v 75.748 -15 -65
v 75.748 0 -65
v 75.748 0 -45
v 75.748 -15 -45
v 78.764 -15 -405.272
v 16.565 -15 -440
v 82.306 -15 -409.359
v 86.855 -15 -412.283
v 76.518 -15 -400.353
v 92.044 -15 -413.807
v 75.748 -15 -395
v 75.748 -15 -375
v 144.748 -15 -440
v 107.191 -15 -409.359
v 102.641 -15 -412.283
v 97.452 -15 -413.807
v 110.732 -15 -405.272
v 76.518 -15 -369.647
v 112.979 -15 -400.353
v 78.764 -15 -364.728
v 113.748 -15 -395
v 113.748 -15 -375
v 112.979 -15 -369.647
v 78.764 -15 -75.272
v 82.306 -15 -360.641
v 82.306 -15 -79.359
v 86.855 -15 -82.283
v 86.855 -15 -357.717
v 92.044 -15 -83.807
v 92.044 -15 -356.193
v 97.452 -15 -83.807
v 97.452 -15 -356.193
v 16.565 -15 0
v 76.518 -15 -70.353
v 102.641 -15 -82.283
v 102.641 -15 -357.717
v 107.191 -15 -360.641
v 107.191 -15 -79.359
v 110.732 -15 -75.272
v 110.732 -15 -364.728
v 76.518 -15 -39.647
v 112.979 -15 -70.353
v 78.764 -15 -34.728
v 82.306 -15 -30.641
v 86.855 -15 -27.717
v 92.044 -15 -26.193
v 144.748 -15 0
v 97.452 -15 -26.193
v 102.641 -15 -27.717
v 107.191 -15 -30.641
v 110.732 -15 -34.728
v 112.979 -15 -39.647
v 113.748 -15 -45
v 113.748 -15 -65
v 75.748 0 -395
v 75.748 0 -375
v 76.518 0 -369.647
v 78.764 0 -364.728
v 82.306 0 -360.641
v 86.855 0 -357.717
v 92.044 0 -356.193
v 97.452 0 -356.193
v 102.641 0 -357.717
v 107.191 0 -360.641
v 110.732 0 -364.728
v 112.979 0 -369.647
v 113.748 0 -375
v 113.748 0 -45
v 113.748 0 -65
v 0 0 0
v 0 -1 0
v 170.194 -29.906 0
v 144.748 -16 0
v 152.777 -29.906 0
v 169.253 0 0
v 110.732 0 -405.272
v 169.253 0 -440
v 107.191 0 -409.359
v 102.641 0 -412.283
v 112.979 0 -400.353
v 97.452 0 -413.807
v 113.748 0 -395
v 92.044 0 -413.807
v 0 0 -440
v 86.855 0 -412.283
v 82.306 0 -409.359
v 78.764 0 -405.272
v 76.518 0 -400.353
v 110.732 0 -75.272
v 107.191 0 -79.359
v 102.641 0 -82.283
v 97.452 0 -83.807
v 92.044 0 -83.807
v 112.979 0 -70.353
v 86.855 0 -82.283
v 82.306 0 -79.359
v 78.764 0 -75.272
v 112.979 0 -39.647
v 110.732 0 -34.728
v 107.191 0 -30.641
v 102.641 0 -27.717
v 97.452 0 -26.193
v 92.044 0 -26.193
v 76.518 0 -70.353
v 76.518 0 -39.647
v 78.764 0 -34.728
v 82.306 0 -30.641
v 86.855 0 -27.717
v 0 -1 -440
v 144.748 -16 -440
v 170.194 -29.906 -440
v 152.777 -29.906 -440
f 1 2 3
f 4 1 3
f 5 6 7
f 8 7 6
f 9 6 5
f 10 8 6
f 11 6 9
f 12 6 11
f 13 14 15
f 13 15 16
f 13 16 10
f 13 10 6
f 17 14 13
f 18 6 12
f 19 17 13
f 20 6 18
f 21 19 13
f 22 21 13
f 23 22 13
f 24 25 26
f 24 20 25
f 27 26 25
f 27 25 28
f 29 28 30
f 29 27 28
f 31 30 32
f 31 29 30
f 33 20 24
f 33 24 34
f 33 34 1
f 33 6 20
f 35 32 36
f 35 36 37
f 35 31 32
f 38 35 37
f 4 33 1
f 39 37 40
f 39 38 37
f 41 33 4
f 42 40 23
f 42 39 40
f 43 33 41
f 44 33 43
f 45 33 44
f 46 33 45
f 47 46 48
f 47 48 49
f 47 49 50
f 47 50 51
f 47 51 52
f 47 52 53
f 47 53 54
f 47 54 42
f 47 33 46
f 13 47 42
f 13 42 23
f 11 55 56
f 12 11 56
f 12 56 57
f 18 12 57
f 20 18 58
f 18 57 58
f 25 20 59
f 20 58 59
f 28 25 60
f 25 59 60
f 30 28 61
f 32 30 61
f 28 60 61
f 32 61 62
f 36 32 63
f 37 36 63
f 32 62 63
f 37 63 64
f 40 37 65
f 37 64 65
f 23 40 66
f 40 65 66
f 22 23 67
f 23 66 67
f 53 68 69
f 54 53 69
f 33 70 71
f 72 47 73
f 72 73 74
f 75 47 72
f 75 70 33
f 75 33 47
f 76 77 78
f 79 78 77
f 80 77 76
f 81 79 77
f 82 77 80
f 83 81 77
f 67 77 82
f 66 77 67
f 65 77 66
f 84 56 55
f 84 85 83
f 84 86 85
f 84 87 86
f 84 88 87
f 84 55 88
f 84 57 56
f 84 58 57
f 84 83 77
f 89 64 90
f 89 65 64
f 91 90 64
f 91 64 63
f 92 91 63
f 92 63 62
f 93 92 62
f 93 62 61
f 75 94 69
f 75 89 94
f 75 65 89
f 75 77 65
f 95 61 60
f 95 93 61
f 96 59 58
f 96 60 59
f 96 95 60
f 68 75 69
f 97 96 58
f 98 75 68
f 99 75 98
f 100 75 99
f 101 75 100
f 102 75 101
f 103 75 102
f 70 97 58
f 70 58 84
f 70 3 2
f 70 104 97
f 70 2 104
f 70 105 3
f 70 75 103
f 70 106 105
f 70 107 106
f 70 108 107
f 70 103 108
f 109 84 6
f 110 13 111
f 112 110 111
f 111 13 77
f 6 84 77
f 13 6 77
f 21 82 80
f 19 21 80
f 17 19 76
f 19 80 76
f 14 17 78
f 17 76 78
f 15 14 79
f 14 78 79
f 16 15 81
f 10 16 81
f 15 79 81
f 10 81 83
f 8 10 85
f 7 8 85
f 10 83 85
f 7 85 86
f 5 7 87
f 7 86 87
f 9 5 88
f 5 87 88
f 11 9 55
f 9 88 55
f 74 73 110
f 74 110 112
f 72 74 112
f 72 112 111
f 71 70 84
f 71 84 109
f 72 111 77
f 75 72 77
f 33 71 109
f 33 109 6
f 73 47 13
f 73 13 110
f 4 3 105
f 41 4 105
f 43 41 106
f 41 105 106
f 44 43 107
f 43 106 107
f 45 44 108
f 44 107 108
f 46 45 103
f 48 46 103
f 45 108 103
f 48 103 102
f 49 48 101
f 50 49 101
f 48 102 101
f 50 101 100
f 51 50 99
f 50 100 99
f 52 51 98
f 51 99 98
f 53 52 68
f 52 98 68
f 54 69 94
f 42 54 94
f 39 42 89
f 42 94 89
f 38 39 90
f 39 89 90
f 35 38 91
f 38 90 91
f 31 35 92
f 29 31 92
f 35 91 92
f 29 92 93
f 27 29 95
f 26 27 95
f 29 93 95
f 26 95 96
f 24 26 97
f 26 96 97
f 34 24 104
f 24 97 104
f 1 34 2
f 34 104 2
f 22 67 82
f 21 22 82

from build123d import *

# Parameters (mm, degrees)
EXTRUDE_1_DEPTH     = 440
CUT_EXTRUDE_1_DEPTH = 30.906162578


with BuildPart() as part:
    # Эскиз1 → Бобышка-Вытянуть1 (new body)
    with BuildSketch(Plane.XY):
        Polygon((169.252902227, 0), (0, 0), (0, -1), (16.565023393, -15), (144.748239349, -15), (144.748239349, -16), (152.776966057, -29.906162578), (170.193520621, -29.906162578), align=None)
    extrude(amount=-EXTRUDE_1_DEPTH)

    # Эскиз4 → Вырез-Вытянуть1 (cut, through all)
    with BuildSketch(Plane(origin=(0, 0, 0), x_dir=(1, 0, 0), z_dir=(0, 1, 0))):
        with BuildLine():
            Line((75.748239349, 65), (75.748239349, 45))
            ThreePointArc((75.748239349, 45), (94.748239349, 26), (113.748239349, 45))
            Line((113.748239349, 45), (113.748239349, 65))
            ThreePointArc((113.748239349, 65), (94.748239349, 84), (75.748239349, 65))
        make_face()
        with BuildLine():
            Line((75.748239349, 395), (75.748239349, 375))
            ThreePointArc((75.748239349, 375), (94.748239349, 356), (113.748239349, 375))
            Line((113.748239349, 375), (113.748239349, 395))
            ThreePointArc((113.748239349, 395), (94.748239349, 414), (75.748239349, 395))
        make_face()
    extrude(amount=-CUT_EXTRUDE_1_DEPTH, mode=Mode.SUBTRACT)


solid = part.part
